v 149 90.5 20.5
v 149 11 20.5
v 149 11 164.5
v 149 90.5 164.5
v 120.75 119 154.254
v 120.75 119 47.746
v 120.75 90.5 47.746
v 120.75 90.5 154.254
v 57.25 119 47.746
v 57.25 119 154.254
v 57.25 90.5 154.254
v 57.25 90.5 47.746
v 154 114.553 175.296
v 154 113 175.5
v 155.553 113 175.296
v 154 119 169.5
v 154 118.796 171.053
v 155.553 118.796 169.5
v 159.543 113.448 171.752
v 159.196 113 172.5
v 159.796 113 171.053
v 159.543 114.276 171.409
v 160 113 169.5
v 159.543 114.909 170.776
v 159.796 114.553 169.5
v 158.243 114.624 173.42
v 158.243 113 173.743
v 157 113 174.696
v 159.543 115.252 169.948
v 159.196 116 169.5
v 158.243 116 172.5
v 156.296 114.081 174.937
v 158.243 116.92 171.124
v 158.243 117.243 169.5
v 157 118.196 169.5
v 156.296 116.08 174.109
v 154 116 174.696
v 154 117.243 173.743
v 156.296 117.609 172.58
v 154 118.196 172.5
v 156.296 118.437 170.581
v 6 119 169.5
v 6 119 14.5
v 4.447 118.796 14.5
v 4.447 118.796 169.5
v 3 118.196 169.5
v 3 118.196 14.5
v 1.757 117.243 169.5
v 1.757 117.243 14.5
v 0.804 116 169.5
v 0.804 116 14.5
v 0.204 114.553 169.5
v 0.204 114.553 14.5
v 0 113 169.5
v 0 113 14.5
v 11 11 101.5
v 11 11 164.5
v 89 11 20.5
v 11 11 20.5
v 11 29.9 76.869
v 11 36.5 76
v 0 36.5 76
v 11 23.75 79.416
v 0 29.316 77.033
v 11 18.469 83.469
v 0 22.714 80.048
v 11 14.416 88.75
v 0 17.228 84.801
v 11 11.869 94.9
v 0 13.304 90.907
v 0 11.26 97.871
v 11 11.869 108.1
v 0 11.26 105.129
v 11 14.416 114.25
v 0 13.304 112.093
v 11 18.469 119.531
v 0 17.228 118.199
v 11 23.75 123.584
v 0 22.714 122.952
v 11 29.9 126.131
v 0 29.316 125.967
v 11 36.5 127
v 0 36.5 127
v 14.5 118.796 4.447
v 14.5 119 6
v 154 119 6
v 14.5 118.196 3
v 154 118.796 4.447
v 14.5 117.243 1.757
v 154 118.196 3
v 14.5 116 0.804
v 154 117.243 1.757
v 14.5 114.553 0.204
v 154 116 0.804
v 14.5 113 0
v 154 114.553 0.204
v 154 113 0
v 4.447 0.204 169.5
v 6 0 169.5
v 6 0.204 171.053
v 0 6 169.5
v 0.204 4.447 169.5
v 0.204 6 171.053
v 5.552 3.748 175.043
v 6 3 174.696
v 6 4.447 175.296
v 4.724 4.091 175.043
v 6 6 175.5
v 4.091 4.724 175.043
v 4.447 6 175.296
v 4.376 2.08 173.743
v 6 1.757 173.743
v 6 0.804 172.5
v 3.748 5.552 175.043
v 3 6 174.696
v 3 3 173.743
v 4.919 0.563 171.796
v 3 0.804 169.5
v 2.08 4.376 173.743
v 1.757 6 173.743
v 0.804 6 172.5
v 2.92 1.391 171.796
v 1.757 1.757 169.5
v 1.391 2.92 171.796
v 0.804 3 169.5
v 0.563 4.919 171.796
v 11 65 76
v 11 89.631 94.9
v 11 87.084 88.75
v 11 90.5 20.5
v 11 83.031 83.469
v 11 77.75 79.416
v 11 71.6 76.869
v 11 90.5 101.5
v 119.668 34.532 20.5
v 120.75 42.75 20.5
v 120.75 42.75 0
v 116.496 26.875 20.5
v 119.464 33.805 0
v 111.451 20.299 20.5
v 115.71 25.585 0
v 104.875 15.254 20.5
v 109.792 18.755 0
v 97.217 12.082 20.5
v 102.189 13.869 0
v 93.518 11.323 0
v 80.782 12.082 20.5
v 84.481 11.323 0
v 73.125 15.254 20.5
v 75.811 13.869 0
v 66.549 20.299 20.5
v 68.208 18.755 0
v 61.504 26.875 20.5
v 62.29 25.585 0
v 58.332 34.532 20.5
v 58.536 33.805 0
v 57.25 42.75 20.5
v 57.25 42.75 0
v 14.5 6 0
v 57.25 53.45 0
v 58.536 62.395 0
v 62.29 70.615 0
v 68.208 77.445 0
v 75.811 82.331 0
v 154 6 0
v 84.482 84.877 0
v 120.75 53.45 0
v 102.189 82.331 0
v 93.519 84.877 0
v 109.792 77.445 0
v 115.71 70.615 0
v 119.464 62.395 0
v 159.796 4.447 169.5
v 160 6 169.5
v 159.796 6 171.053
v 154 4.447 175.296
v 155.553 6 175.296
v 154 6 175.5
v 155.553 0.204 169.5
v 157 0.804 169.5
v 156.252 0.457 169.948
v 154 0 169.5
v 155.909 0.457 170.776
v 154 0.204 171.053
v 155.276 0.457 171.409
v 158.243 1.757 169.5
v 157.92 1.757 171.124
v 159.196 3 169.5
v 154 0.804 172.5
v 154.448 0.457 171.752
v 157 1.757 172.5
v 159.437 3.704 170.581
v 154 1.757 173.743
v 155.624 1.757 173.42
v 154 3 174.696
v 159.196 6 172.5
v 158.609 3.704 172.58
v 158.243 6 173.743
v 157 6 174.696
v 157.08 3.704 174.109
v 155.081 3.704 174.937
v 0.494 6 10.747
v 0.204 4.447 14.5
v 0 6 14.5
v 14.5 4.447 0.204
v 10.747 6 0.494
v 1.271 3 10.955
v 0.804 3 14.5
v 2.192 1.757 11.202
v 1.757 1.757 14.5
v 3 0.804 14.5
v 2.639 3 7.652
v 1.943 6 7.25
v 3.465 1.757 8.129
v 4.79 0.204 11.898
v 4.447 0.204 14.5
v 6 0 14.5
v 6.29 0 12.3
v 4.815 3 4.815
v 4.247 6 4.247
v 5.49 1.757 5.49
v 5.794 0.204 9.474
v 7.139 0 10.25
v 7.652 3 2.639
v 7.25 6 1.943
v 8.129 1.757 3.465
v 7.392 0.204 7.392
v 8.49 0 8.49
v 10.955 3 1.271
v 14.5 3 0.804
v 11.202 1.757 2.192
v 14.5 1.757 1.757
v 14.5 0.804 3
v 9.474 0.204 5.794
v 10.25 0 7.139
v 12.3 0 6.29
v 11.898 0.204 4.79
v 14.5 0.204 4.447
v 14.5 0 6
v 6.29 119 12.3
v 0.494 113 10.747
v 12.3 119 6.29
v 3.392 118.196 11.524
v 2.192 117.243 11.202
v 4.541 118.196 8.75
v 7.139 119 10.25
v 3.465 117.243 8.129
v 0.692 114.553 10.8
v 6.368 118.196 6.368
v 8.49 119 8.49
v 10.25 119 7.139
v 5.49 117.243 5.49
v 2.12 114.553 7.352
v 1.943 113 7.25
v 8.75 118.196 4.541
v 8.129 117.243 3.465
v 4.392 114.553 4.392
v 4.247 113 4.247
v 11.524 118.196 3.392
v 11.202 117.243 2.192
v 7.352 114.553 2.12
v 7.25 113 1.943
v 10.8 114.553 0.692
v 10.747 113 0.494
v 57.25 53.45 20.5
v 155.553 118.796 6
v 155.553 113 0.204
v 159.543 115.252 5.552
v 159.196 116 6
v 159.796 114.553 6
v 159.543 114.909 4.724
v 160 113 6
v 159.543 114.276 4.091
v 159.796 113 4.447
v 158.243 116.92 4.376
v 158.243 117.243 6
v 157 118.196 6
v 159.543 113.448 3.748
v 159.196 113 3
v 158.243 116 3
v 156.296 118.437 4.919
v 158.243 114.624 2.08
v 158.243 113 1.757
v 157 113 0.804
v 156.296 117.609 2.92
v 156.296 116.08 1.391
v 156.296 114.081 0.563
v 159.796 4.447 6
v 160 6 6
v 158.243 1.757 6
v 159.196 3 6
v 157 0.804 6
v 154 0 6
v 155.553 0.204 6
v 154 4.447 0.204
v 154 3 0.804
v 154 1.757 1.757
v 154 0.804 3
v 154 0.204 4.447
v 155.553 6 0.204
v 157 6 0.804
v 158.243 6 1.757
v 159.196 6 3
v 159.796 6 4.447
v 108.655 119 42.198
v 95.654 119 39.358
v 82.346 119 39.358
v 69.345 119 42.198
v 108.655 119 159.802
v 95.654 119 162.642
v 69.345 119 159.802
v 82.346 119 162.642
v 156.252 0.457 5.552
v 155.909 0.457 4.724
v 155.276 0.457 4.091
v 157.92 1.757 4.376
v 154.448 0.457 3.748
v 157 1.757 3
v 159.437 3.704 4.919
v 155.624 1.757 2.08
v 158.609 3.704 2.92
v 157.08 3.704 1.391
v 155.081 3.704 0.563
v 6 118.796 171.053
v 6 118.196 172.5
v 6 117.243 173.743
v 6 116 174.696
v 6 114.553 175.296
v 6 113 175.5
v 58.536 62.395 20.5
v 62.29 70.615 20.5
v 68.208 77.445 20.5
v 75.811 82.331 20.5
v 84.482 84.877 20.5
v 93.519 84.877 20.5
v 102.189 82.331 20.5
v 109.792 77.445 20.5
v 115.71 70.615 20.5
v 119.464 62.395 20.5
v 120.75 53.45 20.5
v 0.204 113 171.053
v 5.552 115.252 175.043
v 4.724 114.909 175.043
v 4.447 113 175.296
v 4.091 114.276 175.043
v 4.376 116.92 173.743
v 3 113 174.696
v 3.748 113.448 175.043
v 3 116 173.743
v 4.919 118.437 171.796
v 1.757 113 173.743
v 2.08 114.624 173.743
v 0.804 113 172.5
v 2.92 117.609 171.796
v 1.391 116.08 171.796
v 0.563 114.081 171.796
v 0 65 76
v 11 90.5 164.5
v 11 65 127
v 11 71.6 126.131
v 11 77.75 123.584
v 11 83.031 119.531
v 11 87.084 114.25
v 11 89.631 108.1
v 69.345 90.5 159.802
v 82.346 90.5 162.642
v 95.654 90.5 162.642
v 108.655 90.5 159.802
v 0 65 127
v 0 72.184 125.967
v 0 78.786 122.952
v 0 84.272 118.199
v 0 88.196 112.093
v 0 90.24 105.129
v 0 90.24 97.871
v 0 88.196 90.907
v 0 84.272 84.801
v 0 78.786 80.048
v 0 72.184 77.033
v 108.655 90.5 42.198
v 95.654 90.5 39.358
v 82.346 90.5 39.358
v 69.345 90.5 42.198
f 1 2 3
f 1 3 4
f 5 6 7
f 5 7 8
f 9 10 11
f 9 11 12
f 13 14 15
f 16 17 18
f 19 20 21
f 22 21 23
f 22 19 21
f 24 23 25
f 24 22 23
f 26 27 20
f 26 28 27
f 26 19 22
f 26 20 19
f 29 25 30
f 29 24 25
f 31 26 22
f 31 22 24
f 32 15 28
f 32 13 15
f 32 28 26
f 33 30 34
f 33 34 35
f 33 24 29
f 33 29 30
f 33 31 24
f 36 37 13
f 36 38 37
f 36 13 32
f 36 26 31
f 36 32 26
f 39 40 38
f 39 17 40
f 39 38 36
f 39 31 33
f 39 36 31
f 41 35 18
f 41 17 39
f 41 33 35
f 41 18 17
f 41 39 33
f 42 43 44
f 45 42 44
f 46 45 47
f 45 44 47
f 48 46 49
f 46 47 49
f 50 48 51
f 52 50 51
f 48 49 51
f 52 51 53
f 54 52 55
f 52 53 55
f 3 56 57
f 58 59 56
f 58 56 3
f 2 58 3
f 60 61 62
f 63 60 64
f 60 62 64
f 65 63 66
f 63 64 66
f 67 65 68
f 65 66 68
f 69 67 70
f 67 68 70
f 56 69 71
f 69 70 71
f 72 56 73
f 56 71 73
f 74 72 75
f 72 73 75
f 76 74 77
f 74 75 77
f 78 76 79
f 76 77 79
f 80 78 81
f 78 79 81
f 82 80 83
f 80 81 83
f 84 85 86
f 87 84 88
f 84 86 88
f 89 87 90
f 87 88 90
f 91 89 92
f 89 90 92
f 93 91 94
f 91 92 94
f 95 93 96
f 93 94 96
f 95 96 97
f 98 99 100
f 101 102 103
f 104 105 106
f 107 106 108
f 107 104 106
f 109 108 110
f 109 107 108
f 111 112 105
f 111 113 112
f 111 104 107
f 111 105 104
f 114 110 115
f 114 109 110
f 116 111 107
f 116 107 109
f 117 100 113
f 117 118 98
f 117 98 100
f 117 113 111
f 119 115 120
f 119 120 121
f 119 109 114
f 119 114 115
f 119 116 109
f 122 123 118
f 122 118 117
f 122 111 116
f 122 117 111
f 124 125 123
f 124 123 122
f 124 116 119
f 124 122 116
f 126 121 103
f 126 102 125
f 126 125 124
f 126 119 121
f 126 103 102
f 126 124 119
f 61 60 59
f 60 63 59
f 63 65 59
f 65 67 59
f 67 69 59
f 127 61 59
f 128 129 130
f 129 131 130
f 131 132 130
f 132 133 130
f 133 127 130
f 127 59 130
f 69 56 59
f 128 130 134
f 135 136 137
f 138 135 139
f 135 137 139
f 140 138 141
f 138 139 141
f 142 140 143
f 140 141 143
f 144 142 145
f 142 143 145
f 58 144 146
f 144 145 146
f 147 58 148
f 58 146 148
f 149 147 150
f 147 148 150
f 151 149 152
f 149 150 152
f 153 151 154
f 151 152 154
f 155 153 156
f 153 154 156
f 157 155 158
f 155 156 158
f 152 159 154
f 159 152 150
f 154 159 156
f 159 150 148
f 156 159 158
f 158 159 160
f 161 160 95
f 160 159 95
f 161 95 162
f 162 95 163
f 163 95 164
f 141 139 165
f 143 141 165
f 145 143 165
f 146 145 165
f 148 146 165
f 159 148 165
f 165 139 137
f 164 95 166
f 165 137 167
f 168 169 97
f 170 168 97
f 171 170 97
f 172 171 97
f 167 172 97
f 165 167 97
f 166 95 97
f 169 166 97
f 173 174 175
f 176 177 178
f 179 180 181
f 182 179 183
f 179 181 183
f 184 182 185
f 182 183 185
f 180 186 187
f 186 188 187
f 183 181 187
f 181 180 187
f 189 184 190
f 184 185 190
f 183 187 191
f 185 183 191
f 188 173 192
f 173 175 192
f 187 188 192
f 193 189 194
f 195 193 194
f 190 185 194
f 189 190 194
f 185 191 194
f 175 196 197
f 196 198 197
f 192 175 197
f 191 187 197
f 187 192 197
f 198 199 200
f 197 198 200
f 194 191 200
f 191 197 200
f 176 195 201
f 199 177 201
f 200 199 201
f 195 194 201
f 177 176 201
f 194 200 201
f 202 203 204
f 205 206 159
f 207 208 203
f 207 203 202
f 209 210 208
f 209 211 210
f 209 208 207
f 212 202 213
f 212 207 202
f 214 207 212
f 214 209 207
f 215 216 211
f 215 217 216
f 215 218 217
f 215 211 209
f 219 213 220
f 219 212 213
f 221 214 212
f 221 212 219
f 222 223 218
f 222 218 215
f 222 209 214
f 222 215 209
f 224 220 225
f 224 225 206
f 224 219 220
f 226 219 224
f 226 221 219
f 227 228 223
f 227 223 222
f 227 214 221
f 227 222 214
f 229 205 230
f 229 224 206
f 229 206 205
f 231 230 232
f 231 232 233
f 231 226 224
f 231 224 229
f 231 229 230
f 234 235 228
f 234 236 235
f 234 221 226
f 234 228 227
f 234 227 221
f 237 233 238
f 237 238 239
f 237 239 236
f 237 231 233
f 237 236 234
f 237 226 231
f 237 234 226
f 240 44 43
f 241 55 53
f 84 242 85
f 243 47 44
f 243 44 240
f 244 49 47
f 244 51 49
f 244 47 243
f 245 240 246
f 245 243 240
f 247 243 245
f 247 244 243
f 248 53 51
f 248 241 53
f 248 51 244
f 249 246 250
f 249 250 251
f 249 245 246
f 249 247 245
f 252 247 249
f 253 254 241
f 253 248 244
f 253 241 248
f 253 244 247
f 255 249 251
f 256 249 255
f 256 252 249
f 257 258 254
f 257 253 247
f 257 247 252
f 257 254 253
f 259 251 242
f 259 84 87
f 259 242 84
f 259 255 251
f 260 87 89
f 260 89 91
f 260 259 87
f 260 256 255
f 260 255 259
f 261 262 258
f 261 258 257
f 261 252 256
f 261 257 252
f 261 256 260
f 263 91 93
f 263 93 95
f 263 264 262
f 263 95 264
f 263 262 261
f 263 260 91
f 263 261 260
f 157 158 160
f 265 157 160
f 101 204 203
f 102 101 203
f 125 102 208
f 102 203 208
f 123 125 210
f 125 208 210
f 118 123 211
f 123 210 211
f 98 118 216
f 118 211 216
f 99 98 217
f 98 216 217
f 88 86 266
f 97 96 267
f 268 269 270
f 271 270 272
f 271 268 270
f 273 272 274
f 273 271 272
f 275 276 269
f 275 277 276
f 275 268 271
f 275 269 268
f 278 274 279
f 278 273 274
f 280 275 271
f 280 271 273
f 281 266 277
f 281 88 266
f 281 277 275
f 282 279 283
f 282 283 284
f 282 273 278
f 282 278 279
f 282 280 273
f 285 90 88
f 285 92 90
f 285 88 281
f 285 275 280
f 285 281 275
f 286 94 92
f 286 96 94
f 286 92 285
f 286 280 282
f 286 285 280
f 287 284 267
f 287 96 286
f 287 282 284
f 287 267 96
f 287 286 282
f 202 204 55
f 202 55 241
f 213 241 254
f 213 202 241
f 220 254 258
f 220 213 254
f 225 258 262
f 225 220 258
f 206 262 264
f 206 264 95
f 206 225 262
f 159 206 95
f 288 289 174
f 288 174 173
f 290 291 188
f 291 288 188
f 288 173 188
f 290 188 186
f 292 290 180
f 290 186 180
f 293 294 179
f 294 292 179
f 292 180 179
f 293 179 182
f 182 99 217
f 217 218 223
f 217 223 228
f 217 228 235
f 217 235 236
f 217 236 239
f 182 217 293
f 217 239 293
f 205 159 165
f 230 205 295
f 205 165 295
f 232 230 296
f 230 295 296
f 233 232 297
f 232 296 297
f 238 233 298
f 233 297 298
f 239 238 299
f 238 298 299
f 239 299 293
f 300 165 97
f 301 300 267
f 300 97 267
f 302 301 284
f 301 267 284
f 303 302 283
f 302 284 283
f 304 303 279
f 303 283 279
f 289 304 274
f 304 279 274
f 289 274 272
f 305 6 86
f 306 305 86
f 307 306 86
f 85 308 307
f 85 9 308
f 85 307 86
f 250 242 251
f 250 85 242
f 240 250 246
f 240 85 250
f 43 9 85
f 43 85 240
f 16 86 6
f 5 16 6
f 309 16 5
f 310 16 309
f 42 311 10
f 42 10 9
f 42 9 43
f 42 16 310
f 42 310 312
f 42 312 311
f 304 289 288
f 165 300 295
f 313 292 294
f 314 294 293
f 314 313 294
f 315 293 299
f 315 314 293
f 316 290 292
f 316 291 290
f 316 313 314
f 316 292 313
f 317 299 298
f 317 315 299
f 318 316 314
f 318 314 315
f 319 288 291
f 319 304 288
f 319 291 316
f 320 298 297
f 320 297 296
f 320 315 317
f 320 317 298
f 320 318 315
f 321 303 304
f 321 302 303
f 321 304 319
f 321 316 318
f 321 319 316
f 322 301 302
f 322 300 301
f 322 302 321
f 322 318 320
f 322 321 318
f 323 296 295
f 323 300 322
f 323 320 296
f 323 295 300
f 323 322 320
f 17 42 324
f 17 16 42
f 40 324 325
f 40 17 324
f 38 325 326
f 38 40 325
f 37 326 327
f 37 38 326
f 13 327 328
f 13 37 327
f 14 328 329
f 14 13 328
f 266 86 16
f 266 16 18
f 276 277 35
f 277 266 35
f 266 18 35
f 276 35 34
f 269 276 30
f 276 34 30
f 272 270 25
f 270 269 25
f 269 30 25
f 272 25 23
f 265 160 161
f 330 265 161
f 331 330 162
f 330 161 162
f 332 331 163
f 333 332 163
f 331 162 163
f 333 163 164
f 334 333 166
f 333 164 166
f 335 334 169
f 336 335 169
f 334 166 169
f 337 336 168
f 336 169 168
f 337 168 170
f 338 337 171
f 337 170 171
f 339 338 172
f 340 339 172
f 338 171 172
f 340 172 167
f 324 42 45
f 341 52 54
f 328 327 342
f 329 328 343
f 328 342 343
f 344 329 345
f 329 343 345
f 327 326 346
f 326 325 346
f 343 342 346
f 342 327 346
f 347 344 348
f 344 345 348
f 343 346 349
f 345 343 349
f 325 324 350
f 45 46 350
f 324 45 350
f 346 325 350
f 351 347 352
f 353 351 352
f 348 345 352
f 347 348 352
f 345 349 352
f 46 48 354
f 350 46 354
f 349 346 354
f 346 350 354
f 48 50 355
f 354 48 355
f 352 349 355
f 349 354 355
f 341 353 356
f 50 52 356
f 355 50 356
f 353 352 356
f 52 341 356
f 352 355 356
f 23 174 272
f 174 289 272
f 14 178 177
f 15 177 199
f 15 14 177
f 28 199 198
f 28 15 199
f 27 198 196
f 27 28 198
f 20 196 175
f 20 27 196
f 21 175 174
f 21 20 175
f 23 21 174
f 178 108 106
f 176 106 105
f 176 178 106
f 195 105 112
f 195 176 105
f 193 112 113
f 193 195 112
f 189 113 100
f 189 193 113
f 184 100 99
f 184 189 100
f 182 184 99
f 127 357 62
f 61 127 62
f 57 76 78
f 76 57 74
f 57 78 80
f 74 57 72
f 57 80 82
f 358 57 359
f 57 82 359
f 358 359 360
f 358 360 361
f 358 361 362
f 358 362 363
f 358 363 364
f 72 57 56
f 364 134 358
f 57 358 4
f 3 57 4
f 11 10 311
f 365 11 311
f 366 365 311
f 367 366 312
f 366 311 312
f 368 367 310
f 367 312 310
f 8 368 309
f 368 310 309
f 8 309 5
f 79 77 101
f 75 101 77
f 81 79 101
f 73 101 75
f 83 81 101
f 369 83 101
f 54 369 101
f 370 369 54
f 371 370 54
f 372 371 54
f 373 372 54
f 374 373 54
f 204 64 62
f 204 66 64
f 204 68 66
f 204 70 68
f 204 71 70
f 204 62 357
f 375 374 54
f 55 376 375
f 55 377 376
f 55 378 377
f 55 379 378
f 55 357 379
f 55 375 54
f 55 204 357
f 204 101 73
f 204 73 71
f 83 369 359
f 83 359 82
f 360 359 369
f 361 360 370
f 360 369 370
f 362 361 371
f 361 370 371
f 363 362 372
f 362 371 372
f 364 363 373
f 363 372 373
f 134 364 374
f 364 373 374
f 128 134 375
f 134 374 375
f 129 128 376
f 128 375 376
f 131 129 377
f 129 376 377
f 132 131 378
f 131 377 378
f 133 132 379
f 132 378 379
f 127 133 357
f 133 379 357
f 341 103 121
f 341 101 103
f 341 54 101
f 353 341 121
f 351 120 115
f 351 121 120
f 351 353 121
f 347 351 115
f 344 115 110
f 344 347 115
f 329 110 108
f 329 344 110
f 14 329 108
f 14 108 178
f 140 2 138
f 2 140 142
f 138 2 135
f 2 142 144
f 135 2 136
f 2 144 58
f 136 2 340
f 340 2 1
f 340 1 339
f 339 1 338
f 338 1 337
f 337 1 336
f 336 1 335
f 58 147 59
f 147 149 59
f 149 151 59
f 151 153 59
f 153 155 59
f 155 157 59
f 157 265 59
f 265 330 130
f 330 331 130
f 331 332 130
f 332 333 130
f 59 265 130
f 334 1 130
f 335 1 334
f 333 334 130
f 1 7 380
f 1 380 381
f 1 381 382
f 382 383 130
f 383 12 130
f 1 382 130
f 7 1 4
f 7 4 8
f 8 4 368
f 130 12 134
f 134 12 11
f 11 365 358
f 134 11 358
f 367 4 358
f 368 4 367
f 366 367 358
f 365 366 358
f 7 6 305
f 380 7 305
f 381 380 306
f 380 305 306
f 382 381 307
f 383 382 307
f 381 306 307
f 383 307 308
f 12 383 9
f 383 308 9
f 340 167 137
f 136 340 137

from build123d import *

# Parameters (mm, degrees)
SKETCH_W             = 160
SKETCH_H             = 119
PAD_DEPTH            = 175.5
THICKNESS_T          = -11
SKETCH001_W          = 138
SKETCH001_H          = 9.5
PAD001_DEPTH         = 108
SKETCH002_W          = 160
SKETCH002_H          = 175.5
PAD002_DEPTH         = 28.5
POCKET_DEPTH         = 20.5
POCKET001_DEPTH      = 11
POCKET002_DEPTH      = 32
POCKET002_DEPTH_BACK = 1
FILLET_R             = 14.5
FILLET001_R          = 6


with BuildPart() as part:
    # Sketch → Pad (new body)
    with BuildSketch(Plane.XY):
        with Locations((80, 59.5)):
            Rectangle(SKETCH_W, SKETCH_H)
    extrude(amount=PAD_DEPTH)

    # Thickness
    thickness_openings = [part.faces().sort_by_distance(p)[0] for p in [
        (80, 119, 87.75),
    ]]
    offset(amount=THICKNESS_T, openings=thickness_openings, kind=Kind.INTERSECTION)

    # Sketch001 (on Face6 of Thickness) → Pad001 (join)
    with BuildSketch(Plane(origin=(0, 119, 0), x_dir=(-1, 0, 0), z_dir=(0, 1, 0))):
        with Locations((-80, 15.75)):
            Rectangle(SKETCH001_W, SKETCH001_H)
    extrude(amount=-PAD001_DEPTH)

    # Sketch002 (on Face6 of Pad001) → Pad002 (join)
    with BuildSketch(Plane(origin=(0, 119, 0), x_dir=(-1, 0, 0), z_dir=(0, 1, 0))):
        with Locations((-80, 87.75)):
            Rectangle(SKETCH002_W, SKETCH002_H)
    extrude(amount=-PAD002_DEPTH)

    # Sketch003 (on Face4 of Pad002) → Pocket (cut)
    with BuildSketch(Plane(origin=(0, 0, 0), x_dir=(1, 0, 0), z_dir=(0, 0, -1))):
        with BuildLine():
            ThreePointArc((120.75, -42.749927), (88.999969, -11), (57.25, -42.749988))
            Line((57.25, -42.749988), (57.25, -53.450058))
            ThreePointArc((57.25, -53.450058), (89.000056, -85.2), (120.75, -53.449945))
            Line((120.75, -53.449945), (120.75, -42.749927))
        make_face()
    extrude(amount=-POCKET_DEPTH, mode=Mode.SUBTRACT)

    # Sketch004 (on Face2 of Pocket) → Pocket001 (cut)
    with BuildSketch(Plane(origin=(0, 0, 0), x_dir=(0, -1, 0), z_dir=(-1, 0, 0))):
        with BuildLine():
            ThreePointArc((-65, 127), (-90.5, 101.5), (-65, 76))
            Line((-65, 76), (-36.5, 76))
            ThreePointArc((-36.5, 76), (-11, 101.5), (-36.5, 127))
            Line((-65, 127), (-36.5, 127))
        make_face()
    extrude(amount=-POCKET001_DEPTH, mode=Mode.SUBTRACT)

    # Sketch005 (on Face6 of Pocket001) → Pocket002 (cut, two sides)
    with BuildSketch(Plane(origin=(0, 119, 0), x_dir=(-1, 0, 0), z_dir=(0, 1, 0))) as pocket002_sk:
        with BuildLine():
            ThreePointArc((-57.249999, 154.253521), (-88.999999, 163), (-120.749999, 154.253521))
            Line((-120.749999, 47.746479), (-120.749999, 154.253521))
            Line((-120.75, 47.746479), (-120.749999, 47.746479))
            ThreePointArc((-120.75, 47.746479), (-89, 39), (-57.249999, 47.746479))
            Line((-57.249999, 154.253521), (-57.249999, 47.746479))
        make_face()
    extrude(amount=-POCKET002_DEPTH, mode=Mode.SUBTRACT)
    extrude(pocket002_sk.sketch, amount=POCKET002_DEPTH_BACK, mode=Mode.SUBTRACT)

    # Fillet
    fillet_edges = [part.edges().sort_by_distance(p)[0] for p in [
        (0, 59.5, 0),
    ]]
    fillet(fillet_edges, radius=FILLET_R)

    # Fillet001
    fillet001_edges = [part.edges().sort_by_distance(p)[0] for p in [
        (87.25, 119, 0),
        (4.246952, 119, 4.246952),
        (0, 119, 95),
        (80, 119, 175.5),
        (160, 59.5, 175.5),
        (160, 119, 87.75),
        (160, 59.5, 0),
        (160, 0, 87.75),
        (87.25, 0, 0),
        (4.246952, 0, 4.246952),
        (0, 0, 95),
        (80, 0, 175.5),
        (0, 59.5, 175.5),
    ]]
    fillet(fillet001_edges, radius=FILLET001_R)


solid = part.part
